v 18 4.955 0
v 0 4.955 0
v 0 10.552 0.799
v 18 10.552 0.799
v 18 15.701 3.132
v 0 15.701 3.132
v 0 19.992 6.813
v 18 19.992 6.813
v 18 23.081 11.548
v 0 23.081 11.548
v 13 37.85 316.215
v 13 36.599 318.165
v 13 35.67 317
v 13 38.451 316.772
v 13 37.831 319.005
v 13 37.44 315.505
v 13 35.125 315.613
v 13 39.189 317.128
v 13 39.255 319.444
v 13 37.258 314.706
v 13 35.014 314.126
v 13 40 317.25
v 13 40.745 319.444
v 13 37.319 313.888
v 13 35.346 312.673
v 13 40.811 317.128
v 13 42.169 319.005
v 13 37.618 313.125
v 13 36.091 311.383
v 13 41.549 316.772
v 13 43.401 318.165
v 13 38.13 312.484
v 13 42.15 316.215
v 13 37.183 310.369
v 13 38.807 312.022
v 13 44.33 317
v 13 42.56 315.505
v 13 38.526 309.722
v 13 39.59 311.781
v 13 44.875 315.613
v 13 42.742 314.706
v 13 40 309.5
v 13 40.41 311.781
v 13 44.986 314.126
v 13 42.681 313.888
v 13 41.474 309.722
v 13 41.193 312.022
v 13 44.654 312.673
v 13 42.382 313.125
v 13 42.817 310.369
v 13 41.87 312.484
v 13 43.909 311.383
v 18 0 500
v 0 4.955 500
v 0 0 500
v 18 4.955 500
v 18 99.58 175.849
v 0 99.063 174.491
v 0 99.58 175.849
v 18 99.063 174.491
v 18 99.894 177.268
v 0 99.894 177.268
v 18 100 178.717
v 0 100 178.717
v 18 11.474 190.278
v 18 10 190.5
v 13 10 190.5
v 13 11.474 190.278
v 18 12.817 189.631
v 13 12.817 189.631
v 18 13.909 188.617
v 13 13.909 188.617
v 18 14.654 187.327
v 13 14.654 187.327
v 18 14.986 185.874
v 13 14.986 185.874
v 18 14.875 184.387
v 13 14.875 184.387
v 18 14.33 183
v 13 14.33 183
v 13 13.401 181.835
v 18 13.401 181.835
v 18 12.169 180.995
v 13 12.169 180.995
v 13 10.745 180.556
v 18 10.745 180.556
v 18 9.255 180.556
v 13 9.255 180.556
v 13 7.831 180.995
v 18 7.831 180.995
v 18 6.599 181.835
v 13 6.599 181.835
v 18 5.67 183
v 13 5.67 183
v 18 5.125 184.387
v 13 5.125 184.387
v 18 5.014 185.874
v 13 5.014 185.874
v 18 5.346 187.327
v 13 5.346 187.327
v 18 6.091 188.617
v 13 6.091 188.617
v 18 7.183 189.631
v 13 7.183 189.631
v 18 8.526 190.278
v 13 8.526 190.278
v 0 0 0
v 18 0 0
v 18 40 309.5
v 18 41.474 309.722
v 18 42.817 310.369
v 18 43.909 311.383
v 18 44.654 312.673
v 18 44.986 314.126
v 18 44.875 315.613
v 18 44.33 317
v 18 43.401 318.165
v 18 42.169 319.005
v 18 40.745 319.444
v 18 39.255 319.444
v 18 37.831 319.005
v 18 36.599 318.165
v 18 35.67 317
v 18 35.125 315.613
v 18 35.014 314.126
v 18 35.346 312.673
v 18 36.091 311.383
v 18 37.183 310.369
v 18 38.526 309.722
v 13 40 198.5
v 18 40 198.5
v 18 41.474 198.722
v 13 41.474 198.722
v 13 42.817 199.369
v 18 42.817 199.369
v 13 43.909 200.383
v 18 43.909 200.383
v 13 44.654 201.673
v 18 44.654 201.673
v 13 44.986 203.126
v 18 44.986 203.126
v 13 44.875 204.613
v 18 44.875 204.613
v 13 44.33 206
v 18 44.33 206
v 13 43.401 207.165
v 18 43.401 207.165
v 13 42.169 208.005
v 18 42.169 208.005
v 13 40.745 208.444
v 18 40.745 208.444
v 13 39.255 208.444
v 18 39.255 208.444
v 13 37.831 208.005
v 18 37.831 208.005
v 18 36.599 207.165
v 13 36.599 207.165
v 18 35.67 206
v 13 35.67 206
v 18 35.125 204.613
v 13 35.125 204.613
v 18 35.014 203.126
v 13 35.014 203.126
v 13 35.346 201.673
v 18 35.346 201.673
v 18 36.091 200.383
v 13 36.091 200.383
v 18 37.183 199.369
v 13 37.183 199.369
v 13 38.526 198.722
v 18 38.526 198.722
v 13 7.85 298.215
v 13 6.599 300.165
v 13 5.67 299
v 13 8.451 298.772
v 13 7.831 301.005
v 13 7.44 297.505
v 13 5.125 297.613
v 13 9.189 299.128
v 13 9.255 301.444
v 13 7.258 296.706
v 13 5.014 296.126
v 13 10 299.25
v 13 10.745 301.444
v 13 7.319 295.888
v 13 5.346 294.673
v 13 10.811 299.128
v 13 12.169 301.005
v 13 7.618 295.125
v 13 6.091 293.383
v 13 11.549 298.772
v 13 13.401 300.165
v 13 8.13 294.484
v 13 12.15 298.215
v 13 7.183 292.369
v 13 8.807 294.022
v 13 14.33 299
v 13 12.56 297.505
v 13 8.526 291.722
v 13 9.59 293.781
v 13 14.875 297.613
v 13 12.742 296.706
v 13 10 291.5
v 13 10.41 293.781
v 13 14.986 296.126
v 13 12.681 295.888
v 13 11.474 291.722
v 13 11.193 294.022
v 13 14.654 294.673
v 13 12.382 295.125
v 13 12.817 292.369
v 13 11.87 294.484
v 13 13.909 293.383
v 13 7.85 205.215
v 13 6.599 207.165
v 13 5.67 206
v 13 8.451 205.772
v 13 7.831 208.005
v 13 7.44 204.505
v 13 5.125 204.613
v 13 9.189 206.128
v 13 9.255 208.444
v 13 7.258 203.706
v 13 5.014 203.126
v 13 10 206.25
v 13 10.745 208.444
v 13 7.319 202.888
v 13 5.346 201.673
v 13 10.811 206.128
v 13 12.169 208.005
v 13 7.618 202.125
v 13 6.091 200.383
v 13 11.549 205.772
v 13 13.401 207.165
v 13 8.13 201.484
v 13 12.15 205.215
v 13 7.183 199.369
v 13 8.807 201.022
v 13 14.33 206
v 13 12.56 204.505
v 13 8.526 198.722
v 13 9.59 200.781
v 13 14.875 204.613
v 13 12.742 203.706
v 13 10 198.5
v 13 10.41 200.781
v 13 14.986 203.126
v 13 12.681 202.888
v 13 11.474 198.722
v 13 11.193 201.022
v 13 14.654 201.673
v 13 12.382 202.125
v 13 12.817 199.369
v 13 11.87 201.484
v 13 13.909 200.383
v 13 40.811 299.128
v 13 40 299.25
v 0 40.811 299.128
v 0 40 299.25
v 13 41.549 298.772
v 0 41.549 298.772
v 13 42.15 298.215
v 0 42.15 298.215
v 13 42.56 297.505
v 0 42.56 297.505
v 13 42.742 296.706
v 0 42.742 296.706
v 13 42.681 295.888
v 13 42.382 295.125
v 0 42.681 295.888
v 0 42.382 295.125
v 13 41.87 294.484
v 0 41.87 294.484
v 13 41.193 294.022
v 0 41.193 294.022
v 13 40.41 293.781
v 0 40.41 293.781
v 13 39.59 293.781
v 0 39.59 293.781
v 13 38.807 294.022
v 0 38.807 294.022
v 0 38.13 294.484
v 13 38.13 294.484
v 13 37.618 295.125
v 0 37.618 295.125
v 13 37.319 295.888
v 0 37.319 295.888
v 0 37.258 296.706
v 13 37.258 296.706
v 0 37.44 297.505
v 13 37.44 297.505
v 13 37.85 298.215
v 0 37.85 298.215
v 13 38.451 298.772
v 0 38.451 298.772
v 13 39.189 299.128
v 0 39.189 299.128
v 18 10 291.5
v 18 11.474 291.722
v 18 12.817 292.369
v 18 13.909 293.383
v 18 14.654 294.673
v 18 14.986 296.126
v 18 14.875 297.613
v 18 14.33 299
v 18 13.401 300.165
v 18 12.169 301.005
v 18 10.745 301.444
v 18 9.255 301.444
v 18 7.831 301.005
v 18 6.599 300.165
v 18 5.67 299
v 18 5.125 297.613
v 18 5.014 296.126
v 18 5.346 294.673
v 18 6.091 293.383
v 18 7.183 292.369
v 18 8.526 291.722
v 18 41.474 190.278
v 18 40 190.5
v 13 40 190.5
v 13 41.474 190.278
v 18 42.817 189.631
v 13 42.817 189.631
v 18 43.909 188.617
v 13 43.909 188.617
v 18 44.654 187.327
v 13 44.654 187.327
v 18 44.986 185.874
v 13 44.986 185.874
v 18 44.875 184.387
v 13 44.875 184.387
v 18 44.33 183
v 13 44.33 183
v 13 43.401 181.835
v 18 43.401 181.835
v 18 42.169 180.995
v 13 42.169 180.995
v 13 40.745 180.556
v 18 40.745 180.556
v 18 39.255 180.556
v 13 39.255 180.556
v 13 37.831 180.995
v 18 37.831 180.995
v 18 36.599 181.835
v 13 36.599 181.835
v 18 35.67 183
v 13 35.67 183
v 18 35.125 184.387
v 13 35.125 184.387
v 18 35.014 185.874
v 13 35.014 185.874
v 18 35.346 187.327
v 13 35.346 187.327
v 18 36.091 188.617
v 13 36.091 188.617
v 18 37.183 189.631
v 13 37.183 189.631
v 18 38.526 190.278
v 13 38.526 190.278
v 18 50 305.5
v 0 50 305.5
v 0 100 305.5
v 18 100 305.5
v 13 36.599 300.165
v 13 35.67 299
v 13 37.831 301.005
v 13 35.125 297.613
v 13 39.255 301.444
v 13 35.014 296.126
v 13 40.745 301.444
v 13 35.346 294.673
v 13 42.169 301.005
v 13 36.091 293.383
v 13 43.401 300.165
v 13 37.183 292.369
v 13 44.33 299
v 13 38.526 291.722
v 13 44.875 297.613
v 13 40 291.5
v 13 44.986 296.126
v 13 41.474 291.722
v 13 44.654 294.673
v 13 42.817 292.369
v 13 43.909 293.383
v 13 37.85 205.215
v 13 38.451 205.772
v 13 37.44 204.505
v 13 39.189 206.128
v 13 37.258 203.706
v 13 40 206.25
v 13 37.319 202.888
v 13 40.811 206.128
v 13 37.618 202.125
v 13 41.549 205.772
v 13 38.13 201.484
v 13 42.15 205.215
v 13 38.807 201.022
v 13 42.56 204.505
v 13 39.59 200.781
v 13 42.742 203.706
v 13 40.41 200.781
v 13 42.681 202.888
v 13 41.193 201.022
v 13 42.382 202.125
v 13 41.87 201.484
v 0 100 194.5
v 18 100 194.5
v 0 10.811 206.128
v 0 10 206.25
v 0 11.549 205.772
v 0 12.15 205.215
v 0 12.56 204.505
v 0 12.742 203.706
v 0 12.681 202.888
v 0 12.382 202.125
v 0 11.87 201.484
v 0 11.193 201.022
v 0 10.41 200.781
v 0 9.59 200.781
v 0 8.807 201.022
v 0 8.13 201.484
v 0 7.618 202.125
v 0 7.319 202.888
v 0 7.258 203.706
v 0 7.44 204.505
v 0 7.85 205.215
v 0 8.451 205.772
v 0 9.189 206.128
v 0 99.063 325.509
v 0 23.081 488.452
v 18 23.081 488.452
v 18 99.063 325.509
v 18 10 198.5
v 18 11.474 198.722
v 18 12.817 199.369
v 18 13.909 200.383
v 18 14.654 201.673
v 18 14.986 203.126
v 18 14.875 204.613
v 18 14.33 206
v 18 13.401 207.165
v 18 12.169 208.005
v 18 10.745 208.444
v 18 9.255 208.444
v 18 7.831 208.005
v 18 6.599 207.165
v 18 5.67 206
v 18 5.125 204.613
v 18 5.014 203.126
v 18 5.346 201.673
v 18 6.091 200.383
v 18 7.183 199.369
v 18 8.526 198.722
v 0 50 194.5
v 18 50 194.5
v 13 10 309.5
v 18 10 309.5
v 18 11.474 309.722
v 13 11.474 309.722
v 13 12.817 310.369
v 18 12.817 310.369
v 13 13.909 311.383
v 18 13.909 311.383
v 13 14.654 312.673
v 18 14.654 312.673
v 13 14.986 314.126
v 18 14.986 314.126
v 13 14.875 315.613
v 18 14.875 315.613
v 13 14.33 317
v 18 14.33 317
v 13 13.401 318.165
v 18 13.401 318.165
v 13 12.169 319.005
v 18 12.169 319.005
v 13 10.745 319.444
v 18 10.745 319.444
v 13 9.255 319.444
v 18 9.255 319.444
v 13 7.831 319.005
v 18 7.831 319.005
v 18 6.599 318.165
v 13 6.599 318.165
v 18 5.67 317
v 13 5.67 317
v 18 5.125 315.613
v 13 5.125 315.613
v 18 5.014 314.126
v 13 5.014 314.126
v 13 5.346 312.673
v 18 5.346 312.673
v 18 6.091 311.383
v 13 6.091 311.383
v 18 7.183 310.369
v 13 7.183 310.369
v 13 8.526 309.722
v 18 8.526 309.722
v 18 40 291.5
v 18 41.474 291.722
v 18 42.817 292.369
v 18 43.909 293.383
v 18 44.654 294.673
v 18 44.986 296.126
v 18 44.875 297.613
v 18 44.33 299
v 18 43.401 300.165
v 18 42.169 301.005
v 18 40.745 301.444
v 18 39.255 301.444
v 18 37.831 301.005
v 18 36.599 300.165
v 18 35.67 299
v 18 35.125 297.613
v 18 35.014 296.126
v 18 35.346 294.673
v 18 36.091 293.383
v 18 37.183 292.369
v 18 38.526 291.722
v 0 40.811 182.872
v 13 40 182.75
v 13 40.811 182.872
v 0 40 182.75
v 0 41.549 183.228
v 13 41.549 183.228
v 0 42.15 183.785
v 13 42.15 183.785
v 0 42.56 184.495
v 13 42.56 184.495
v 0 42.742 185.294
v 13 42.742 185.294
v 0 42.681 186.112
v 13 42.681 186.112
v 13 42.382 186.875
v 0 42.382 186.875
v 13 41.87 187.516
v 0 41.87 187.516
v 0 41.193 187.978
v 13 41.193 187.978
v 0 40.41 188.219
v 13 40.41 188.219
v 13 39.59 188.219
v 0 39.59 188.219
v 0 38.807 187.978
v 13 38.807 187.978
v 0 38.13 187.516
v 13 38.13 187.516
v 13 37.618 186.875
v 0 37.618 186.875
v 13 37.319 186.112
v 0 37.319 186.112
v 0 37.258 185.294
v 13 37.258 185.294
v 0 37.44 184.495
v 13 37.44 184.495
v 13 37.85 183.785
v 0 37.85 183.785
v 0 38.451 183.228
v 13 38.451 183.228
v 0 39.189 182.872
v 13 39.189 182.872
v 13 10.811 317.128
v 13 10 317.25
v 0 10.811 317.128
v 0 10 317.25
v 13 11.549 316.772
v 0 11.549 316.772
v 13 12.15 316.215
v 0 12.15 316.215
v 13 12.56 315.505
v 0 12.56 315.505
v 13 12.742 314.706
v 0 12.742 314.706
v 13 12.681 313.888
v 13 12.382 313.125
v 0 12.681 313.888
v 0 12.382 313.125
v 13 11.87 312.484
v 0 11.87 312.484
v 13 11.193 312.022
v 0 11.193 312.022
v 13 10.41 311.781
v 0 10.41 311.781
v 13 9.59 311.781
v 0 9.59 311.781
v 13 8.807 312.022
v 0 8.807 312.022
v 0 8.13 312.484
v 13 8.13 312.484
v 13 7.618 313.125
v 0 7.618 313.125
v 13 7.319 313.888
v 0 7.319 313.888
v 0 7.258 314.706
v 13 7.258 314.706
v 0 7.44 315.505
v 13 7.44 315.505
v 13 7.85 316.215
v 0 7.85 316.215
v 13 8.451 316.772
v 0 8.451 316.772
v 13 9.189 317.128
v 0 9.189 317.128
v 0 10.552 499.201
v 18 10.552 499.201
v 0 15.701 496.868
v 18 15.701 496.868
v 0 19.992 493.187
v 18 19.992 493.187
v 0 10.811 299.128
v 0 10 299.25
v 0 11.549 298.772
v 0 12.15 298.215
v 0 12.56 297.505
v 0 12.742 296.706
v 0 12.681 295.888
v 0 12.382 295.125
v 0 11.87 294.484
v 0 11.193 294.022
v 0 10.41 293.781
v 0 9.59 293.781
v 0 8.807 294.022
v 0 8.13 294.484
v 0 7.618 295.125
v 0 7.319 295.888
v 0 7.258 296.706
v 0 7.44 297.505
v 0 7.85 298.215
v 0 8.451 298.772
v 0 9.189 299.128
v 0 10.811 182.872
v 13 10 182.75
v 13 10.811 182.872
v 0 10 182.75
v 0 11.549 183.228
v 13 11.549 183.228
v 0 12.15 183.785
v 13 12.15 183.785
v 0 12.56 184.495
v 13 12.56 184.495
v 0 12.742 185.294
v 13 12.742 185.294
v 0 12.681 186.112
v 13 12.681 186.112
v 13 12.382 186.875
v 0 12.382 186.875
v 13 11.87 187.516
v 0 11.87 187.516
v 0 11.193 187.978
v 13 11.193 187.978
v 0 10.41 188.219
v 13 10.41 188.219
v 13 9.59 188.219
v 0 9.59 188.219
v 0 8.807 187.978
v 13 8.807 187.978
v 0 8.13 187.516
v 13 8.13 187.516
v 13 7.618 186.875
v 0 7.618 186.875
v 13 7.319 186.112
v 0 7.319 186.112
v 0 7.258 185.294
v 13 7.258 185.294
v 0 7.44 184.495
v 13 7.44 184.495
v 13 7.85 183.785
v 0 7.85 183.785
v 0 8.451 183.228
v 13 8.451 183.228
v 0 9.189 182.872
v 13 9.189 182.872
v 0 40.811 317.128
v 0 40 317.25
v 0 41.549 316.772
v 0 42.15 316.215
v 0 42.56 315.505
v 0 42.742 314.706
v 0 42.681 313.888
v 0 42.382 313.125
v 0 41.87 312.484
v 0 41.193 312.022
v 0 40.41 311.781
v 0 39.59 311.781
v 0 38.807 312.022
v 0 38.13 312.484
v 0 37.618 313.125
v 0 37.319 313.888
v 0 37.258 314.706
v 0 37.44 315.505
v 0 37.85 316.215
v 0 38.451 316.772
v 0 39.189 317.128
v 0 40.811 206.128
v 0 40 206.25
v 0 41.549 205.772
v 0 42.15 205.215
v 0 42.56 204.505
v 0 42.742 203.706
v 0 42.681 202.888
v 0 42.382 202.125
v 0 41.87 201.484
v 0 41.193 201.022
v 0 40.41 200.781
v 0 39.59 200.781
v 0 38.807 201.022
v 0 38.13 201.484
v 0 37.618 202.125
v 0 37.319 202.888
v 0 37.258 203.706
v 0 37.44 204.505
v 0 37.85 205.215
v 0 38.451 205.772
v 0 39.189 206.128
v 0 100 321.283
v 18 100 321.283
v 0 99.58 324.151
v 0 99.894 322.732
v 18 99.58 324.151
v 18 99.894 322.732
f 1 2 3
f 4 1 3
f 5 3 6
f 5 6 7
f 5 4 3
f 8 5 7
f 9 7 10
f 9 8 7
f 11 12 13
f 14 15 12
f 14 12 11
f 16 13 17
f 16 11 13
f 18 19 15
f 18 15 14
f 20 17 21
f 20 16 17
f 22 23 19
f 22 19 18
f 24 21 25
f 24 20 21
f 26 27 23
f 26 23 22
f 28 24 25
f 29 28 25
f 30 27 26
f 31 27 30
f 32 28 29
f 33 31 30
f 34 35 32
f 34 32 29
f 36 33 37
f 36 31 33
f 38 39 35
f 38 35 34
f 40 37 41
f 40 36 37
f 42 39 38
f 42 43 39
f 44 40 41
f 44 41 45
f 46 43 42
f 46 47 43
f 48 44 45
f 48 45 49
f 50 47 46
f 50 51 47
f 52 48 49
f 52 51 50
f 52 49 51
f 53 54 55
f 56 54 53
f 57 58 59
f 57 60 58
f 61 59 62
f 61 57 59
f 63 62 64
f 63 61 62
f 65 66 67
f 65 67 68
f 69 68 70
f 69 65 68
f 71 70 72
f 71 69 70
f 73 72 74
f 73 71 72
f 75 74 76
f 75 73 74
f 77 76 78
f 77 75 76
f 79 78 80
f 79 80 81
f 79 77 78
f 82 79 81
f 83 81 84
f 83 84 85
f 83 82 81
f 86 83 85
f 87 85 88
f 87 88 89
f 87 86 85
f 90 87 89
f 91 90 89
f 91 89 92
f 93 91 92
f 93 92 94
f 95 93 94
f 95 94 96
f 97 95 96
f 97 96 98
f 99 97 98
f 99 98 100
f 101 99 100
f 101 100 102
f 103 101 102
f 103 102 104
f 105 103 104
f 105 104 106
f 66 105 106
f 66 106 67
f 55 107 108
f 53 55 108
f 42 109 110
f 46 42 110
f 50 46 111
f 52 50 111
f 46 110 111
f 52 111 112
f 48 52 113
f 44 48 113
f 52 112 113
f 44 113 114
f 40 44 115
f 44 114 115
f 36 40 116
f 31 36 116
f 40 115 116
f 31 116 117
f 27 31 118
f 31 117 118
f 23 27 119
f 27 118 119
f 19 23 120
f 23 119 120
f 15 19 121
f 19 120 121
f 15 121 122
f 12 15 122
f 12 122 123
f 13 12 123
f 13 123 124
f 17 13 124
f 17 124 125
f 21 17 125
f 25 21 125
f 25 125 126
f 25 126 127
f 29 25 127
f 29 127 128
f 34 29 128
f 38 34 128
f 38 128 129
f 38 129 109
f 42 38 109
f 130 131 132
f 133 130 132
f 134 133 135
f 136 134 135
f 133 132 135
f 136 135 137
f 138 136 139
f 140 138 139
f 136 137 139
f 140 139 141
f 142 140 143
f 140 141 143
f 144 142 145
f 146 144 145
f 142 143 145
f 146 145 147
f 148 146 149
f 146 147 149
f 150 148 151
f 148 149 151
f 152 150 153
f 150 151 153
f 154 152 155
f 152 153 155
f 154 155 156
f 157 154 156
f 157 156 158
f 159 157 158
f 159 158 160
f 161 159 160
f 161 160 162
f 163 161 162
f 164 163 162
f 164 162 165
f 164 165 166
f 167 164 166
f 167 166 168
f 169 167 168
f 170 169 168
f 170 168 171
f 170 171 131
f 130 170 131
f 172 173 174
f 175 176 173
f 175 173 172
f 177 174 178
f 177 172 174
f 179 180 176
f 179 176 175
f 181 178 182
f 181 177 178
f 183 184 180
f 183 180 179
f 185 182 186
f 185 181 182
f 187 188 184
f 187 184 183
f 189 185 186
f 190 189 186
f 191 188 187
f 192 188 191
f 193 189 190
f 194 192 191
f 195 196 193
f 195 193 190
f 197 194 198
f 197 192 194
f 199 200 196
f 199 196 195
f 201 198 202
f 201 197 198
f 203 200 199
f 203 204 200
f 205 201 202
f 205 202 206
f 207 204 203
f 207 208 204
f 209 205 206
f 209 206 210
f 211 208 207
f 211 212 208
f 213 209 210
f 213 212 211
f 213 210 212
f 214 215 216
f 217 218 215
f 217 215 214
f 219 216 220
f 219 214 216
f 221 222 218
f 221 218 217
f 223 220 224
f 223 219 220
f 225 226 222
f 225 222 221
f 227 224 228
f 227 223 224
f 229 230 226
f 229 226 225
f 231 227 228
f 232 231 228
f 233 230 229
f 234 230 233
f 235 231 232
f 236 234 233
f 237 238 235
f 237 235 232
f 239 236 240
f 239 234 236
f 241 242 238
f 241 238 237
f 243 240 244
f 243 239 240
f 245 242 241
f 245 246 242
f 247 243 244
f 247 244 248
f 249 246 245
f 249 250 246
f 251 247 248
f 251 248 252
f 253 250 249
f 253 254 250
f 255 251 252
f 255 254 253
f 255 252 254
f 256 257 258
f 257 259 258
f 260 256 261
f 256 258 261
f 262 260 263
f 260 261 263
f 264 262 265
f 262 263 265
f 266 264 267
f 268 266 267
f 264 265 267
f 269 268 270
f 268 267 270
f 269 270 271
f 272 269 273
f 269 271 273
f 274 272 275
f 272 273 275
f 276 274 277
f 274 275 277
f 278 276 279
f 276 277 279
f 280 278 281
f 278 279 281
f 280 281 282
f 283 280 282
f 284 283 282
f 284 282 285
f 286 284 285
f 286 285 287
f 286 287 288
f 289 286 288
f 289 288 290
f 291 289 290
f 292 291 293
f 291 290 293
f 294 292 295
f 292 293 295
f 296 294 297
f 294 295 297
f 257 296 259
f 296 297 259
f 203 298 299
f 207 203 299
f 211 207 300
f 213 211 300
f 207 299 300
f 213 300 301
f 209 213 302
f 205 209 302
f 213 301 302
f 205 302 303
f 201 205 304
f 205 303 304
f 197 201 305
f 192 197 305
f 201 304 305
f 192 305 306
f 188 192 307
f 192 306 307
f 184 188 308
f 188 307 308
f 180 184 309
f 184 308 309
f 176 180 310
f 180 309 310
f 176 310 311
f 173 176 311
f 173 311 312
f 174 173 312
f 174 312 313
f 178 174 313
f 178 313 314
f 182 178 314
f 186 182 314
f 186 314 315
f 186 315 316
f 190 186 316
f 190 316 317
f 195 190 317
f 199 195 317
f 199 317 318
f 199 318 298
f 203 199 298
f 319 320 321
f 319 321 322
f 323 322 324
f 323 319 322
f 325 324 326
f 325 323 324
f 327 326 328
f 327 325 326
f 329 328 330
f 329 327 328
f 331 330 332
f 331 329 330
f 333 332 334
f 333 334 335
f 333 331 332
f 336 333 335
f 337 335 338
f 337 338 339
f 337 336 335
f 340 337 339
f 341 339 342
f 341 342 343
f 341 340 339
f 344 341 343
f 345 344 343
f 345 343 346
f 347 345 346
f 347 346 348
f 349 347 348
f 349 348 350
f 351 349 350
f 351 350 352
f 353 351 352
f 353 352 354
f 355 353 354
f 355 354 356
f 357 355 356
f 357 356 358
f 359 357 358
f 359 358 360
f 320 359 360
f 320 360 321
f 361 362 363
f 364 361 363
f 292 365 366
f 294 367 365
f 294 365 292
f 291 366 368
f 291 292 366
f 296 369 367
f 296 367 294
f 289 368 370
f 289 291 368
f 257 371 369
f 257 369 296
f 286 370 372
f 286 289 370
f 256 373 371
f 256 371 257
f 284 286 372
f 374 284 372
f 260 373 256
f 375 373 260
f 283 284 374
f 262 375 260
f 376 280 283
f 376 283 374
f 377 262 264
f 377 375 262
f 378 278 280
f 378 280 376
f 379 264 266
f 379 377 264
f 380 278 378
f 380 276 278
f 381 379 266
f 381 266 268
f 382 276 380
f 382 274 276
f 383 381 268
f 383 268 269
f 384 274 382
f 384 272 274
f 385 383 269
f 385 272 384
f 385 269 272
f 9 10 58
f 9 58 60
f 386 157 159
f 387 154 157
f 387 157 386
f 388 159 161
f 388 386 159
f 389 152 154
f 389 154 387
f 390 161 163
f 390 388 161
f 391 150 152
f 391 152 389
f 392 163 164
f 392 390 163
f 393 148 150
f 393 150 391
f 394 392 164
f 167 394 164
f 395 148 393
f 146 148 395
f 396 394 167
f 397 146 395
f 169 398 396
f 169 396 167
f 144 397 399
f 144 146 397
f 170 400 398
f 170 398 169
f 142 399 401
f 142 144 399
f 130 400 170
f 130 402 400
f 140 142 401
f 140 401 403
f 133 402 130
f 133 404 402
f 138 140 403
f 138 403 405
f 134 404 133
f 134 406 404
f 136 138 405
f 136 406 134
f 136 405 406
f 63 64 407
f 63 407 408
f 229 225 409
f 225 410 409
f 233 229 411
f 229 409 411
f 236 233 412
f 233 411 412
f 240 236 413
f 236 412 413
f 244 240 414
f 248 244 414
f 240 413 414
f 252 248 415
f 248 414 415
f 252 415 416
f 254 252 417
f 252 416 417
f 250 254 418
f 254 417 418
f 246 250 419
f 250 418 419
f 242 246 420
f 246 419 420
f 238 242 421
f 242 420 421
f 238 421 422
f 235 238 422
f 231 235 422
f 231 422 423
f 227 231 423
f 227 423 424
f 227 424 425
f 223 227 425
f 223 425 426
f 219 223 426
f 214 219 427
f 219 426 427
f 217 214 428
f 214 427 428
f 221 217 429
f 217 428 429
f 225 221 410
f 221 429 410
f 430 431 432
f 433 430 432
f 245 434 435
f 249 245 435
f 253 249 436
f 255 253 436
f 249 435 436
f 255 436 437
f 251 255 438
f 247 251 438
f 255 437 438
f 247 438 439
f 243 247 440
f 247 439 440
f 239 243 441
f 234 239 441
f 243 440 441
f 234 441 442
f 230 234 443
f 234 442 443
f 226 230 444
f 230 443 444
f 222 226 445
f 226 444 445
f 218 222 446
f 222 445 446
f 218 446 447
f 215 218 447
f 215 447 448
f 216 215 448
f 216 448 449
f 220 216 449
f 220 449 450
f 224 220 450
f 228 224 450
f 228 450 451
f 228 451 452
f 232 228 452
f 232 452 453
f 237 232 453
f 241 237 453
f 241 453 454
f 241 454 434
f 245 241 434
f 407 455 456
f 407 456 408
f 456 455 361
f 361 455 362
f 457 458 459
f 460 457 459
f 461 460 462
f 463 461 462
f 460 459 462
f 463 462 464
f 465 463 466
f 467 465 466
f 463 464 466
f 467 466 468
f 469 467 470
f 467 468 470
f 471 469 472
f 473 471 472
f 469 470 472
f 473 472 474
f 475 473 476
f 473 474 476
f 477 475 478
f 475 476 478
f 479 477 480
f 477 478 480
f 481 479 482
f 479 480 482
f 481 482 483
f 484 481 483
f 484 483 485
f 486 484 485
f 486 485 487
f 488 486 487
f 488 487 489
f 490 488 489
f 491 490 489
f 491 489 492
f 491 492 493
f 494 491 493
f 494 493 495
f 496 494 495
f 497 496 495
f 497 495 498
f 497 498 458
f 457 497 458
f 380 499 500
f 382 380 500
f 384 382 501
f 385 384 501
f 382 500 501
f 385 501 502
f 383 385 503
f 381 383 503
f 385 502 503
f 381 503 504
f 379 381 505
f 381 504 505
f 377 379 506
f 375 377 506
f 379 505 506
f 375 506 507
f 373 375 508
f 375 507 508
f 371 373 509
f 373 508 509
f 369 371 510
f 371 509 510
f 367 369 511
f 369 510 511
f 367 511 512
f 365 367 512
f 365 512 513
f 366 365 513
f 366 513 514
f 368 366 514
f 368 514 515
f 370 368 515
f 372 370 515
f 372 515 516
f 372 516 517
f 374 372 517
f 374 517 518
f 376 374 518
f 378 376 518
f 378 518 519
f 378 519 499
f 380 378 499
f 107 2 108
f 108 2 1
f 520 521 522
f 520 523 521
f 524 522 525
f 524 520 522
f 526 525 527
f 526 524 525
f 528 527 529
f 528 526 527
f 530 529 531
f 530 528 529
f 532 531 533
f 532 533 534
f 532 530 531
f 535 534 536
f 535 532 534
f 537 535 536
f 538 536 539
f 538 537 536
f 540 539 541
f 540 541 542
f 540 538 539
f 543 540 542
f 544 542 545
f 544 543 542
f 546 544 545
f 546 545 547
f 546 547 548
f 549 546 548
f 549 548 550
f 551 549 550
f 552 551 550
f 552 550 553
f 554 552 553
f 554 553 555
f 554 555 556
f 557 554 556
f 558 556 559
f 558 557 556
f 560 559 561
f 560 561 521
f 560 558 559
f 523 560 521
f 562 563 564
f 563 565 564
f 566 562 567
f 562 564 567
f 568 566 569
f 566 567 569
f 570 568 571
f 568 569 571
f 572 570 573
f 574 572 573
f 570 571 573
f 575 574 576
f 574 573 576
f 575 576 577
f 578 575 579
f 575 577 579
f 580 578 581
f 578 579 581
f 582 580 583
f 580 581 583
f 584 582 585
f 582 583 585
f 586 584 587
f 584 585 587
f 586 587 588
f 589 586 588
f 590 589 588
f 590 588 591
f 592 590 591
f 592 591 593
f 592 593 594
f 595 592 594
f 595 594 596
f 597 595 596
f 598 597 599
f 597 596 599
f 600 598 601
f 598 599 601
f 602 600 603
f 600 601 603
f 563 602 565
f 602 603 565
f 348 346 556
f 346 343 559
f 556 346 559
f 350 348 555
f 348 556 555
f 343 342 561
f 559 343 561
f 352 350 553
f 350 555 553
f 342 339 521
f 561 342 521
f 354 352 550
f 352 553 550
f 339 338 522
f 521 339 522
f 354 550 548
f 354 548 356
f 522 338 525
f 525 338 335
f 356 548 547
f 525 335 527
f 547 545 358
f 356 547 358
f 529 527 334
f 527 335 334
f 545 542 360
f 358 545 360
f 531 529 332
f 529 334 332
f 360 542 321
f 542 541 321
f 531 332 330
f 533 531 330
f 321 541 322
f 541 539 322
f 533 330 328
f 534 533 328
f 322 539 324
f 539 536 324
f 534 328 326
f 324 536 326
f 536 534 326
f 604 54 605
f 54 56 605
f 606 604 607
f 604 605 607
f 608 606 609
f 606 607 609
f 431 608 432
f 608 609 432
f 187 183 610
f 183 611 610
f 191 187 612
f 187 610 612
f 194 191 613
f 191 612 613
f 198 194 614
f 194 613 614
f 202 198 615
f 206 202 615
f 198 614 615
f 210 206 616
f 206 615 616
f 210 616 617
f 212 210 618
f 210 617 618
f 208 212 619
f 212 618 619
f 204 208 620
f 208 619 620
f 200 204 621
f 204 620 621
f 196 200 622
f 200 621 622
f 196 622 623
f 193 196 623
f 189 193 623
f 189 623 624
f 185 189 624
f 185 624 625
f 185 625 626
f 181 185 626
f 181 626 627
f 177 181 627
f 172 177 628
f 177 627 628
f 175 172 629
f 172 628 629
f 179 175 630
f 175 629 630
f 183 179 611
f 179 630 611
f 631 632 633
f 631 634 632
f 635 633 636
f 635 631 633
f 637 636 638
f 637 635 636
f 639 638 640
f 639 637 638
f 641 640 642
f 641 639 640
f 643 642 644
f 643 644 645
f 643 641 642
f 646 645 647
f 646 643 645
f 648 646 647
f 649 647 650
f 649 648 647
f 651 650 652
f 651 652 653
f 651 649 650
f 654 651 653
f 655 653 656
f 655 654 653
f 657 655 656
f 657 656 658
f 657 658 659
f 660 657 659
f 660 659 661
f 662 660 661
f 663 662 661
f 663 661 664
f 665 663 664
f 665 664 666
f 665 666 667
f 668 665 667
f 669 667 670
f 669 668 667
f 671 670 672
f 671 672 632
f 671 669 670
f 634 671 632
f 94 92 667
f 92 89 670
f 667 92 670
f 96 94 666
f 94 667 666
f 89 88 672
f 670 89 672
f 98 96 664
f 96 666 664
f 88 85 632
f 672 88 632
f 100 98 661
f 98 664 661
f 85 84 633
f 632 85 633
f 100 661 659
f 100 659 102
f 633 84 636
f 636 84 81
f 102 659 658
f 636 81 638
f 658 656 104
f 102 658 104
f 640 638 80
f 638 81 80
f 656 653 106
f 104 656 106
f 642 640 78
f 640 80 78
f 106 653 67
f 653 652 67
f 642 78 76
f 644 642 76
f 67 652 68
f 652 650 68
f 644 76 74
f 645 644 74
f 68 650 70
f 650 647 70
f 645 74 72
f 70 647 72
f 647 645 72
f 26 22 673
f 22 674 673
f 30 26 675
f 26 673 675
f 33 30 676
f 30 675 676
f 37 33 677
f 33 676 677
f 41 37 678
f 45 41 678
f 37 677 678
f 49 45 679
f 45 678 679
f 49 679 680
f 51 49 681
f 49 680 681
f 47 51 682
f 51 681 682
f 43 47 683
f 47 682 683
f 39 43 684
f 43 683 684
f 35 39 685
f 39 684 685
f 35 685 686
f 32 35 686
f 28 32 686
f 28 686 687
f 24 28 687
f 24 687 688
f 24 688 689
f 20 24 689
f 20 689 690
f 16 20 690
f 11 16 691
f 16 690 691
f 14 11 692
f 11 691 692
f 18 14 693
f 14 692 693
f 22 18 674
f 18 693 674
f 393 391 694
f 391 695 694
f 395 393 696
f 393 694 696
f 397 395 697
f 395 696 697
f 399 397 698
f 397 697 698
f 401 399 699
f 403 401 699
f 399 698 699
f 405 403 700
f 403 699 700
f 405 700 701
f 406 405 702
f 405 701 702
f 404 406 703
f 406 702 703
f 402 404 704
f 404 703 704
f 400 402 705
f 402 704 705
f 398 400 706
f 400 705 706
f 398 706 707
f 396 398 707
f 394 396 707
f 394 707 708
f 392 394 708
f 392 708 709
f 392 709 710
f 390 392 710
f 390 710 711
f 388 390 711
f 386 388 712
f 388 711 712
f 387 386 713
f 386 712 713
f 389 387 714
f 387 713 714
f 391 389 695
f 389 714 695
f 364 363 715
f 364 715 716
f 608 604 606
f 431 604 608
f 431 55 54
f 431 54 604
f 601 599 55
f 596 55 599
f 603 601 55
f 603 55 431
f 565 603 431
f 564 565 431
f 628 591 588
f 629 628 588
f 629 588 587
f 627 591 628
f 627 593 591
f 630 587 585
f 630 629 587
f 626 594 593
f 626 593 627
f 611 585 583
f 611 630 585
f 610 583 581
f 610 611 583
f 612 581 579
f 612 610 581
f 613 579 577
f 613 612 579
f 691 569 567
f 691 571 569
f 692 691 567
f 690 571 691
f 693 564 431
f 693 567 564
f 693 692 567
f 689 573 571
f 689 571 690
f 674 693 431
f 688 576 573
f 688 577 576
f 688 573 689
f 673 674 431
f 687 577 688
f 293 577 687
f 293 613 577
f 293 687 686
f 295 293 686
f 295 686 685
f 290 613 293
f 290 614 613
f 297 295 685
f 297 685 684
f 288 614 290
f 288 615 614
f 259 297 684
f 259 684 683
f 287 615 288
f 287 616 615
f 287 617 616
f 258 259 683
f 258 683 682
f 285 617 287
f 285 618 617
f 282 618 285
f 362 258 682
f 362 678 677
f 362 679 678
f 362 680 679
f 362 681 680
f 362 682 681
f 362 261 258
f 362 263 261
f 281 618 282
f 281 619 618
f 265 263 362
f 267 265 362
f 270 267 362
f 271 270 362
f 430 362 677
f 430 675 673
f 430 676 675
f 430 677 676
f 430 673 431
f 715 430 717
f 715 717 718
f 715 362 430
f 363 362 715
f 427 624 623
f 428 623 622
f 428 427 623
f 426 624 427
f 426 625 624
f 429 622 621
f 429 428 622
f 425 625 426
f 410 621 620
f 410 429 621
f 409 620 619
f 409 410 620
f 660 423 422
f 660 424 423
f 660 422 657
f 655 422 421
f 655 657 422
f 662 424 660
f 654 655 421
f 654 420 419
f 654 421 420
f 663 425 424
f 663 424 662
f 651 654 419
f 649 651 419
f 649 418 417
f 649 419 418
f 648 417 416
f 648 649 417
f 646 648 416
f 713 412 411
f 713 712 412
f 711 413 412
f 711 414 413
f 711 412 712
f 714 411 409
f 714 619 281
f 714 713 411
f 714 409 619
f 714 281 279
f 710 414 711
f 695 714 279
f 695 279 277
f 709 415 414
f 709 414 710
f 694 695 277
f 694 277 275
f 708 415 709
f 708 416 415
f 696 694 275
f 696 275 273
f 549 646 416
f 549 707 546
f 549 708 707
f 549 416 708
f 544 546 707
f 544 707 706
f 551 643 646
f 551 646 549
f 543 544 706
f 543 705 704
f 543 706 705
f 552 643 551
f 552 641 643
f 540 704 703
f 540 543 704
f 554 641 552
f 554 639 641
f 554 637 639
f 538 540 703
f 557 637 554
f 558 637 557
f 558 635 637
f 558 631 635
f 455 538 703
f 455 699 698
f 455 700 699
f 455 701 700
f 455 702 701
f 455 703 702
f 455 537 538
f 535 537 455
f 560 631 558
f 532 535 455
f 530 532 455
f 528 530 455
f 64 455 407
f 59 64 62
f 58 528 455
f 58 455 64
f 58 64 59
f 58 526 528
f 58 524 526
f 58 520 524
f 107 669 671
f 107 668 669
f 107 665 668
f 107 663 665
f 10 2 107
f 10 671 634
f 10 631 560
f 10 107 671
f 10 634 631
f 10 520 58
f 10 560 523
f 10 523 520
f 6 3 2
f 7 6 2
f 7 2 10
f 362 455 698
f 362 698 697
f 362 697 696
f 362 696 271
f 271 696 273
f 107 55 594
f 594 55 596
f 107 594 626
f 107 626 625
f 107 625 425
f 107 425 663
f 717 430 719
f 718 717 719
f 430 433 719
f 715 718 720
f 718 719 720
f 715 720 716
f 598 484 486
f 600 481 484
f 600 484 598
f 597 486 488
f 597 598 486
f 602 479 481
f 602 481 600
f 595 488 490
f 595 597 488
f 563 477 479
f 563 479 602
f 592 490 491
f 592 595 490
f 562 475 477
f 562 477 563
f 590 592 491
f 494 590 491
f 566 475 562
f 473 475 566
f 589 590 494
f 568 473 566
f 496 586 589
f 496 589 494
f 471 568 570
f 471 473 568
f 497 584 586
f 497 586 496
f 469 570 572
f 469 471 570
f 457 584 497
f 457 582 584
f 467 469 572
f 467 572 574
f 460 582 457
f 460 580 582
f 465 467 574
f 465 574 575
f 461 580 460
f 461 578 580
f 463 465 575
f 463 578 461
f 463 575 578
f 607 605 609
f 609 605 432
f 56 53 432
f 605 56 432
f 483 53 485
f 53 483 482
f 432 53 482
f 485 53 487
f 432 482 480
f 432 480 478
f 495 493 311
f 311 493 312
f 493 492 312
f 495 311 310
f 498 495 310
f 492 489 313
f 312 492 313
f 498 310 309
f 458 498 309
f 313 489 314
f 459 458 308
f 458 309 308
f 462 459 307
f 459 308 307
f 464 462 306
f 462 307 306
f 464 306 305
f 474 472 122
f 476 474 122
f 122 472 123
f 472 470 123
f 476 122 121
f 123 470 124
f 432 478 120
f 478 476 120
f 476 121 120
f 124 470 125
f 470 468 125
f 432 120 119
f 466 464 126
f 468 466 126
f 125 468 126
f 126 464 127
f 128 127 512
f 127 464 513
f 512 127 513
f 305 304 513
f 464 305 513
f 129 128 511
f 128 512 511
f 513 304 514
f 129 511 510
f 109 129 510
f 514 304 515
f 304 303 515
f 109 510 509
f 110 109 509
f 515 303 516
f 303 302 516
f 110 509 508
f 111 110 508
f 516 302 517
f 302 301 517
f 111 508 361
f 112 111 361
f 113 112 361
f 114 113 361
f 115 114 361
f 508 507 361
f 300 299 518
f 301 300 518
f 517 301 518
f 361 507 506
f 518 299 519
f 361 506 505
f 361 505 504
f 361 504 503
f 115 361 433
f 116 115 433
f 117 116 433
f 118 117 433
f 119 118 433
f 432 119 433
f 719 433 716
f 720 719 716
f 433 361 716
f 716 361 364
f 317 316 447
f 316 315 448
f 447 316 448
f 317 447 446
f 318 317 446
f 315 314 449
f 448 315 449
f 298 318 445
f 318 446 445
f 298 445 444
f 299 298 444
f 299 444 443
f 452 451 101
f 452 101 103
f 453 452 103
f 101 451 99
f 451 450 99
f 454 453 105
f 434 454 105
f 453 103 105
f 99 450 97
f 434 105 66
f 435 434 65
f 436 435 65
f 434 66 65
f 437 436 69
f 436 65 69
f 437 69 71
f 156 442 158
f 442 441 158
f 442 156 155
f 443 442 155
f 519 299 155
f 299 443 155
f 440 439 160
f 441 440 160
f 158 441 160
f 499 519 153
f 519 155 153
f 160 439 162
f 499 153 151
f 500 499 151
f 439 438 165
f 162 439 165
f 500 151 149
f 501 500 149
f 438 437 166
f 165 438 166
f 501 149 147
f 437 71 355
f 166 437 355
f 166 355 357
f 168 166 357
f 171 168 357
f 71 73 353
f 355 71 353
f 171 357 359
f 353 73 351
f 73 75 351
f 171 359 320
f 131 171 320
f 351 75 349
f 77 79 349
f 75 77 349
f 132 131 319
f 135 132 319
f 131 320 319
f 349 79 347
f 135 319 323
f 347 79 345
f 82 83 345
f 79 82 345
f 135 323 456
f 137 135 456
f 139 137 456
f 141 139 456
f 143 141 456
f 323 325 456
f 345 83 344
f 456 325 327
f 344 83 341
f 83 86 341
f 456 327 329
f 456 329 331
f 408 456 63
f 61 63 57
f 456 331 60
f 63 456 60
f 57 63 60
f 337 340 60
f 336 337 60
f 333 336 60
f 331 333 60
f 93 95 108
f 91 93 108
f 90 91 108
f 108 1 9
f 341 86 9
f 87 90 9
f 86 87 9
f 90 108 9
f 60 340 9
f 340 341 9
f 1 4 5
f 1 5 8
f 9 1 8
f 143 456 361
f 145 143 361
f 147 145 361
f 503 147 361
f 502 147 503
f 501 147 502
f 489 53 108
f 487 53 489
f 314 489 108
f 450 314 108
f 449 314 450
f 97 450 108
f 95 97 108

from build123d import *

# Parameters (mm, degrees)
SKETCH1_W                               = 18
SKETCH1_H                               = 100
BASE_DEPTH                              = 500
SKETCH2_W                               = 111
SKETCH2_H                               = 50
LAP_JOINT_CUTOUT_DEPTH                  = 511.219560582
LAP_JOINT_BOLT_HOLE_PATTERN_D           = 5.5
LAP_JOINT_BOLT_HOLE_PATTERN_CBORE_D     = 10
LAP_JOINT_BOLT_HOLE_PATTERN_CBORE_DEPTH = 5
CHAMFER_FRONT_SIZE                      = 176.5
CHAMFER_FRONT_SIZE2                     = 82.303301664
CHAMFER_REAR_SIZE                       = 176.5
CHAMFER_REAR_SIZE2                      = 82.303301664
BREAK_CHAMFER_OUTER_CORNERS_R           = 20
CROSS_TIE_BOLT_HOLE_PATTERN_D           = 5.5
CROSS_TIE_BOLT_HOLE_PATTERN_CBORE_D     = 10
CROSS_TIE_BOLT_HOLE_PATTERN_CBORE_DEPTH = 5
FILLET1_R                               = 10


with BuildPart() as part:
    # Sketch1 → base (new body)
    with BuildSketch(Plane.XY):
        with Locations((9, 50)):
            Rectangle(SKETCH1_W, SKETCH1_H)
    extrude(amount=BASE_DEPTH)

    # Sketch2 → lap joint cutout (cut, through all)
    with BuildSketch(Plane.ZY):
        with Locations((250, 75)):
            Rectangle(SKETCH2_W, SKETCH2_H)
    extrude(amount=-LAP_JOINT_CUTOUT_DEPTH, mode=Mode.SUBTRACT)

    # lap joint bolt hole pattern (through all)
    with Locations(Plane(origin=(18, 0, 0), x_dir=(0, 0, -1), z_dir=(1, 0, 0))):
        with Locations((-296.5, 40), (-203.5, 10), (-296.5, 10), (-203.5, 40)):
            CounterBoreHole(LAP_JOINT_BOLT_HOLE_PATTERN_D / 2, LAP_JOINT_BOLT_HOLE_PATTERN_CBORE_D / 2, LAP_JOINT_BOLT_HOLE_PATTERN_CBORE_DEPTH)

    # chamfer front
    chamfer_front_edges = [part.edges().sort_by_distance(p)[0] for p in [
        (9, 100, 0),
    ]]
    chamfer_front_side = [part.faces().sort_by_distance(p)[0] for p in [
        (9, 100, 97.25),
    ]]
    chamfer(chamfer_front_edges, length=CHAMFER_FRONT_SIZE, length2=CHAMFER_FRONT_SIZE2, reference=chamfer_front_side[0])

    # chamfer rear
    chamfer_rear_edges = [part.edges().sort_by_distance(p)[0] for p in [
        (9, 100, 500),
    ]]
    chamfer_rear_side = [part.faces().sort_by_distance(p)[0] for p in [
        (9, 100, 402.75),
    ]]
    chamfer(chamfer_rear_edges, length=CHAMFER_REAR_SIZE, length2=CHAMFER_REAR_SIZE2, reference=chamfer_rear_side[0])

    # break chamfer outer corners
    break_chamfer_outer_corners_edges = [part.edges().sort_by_distance(p)[0] for p in [
        (9, 17.696698336, 0),
        (9, 17.696698336, 500),
    ]]
    fillet(break_chamfer_outer_corners_edges, radius=BREAK_CHAMFER_OUTER_CORNERS_R)

    # cross tie bolt hole pattern (through all)
    with Locations(Plane(origin=(18, 0, 0), x_dir=(0, 0, -1), z_dir=(1, 0, 0))):
        with Locations((-314.5, 40), (-314.5, 10)):
            cross_tie_bolt_hole_pattern = CounterBoreHole(CROSS_TIE_BOLT_HOLE_PATTERN_D / 2, CROSS_TIE_BOLT_HOLE_PATTERN_CBORE_D / 2, CROSS_TIE_BOLT_HOLE_PATTERN_CBORE_DEPTH)

    # mirror cross tie bolt hole pattern: cross tie bolt hole pattern across plane
    add(cross_tie_bolt_hole_pattern.mirror(Plane(origin=(0, 0, 250), x_dir=(1, 0, 0), z_dir=(0, 0, -1))), mode=Mode.SUBTRACT)

    # Fillet1
    fillet1_edges = [part.edges().sort_by_distance(p)[0] for p in [
        (9, 100, 176.5),
        (9, 100, 323.5),
    ]]
    fillet(fillet1_edges, radius=FILLET1_R)


solid = part.part
